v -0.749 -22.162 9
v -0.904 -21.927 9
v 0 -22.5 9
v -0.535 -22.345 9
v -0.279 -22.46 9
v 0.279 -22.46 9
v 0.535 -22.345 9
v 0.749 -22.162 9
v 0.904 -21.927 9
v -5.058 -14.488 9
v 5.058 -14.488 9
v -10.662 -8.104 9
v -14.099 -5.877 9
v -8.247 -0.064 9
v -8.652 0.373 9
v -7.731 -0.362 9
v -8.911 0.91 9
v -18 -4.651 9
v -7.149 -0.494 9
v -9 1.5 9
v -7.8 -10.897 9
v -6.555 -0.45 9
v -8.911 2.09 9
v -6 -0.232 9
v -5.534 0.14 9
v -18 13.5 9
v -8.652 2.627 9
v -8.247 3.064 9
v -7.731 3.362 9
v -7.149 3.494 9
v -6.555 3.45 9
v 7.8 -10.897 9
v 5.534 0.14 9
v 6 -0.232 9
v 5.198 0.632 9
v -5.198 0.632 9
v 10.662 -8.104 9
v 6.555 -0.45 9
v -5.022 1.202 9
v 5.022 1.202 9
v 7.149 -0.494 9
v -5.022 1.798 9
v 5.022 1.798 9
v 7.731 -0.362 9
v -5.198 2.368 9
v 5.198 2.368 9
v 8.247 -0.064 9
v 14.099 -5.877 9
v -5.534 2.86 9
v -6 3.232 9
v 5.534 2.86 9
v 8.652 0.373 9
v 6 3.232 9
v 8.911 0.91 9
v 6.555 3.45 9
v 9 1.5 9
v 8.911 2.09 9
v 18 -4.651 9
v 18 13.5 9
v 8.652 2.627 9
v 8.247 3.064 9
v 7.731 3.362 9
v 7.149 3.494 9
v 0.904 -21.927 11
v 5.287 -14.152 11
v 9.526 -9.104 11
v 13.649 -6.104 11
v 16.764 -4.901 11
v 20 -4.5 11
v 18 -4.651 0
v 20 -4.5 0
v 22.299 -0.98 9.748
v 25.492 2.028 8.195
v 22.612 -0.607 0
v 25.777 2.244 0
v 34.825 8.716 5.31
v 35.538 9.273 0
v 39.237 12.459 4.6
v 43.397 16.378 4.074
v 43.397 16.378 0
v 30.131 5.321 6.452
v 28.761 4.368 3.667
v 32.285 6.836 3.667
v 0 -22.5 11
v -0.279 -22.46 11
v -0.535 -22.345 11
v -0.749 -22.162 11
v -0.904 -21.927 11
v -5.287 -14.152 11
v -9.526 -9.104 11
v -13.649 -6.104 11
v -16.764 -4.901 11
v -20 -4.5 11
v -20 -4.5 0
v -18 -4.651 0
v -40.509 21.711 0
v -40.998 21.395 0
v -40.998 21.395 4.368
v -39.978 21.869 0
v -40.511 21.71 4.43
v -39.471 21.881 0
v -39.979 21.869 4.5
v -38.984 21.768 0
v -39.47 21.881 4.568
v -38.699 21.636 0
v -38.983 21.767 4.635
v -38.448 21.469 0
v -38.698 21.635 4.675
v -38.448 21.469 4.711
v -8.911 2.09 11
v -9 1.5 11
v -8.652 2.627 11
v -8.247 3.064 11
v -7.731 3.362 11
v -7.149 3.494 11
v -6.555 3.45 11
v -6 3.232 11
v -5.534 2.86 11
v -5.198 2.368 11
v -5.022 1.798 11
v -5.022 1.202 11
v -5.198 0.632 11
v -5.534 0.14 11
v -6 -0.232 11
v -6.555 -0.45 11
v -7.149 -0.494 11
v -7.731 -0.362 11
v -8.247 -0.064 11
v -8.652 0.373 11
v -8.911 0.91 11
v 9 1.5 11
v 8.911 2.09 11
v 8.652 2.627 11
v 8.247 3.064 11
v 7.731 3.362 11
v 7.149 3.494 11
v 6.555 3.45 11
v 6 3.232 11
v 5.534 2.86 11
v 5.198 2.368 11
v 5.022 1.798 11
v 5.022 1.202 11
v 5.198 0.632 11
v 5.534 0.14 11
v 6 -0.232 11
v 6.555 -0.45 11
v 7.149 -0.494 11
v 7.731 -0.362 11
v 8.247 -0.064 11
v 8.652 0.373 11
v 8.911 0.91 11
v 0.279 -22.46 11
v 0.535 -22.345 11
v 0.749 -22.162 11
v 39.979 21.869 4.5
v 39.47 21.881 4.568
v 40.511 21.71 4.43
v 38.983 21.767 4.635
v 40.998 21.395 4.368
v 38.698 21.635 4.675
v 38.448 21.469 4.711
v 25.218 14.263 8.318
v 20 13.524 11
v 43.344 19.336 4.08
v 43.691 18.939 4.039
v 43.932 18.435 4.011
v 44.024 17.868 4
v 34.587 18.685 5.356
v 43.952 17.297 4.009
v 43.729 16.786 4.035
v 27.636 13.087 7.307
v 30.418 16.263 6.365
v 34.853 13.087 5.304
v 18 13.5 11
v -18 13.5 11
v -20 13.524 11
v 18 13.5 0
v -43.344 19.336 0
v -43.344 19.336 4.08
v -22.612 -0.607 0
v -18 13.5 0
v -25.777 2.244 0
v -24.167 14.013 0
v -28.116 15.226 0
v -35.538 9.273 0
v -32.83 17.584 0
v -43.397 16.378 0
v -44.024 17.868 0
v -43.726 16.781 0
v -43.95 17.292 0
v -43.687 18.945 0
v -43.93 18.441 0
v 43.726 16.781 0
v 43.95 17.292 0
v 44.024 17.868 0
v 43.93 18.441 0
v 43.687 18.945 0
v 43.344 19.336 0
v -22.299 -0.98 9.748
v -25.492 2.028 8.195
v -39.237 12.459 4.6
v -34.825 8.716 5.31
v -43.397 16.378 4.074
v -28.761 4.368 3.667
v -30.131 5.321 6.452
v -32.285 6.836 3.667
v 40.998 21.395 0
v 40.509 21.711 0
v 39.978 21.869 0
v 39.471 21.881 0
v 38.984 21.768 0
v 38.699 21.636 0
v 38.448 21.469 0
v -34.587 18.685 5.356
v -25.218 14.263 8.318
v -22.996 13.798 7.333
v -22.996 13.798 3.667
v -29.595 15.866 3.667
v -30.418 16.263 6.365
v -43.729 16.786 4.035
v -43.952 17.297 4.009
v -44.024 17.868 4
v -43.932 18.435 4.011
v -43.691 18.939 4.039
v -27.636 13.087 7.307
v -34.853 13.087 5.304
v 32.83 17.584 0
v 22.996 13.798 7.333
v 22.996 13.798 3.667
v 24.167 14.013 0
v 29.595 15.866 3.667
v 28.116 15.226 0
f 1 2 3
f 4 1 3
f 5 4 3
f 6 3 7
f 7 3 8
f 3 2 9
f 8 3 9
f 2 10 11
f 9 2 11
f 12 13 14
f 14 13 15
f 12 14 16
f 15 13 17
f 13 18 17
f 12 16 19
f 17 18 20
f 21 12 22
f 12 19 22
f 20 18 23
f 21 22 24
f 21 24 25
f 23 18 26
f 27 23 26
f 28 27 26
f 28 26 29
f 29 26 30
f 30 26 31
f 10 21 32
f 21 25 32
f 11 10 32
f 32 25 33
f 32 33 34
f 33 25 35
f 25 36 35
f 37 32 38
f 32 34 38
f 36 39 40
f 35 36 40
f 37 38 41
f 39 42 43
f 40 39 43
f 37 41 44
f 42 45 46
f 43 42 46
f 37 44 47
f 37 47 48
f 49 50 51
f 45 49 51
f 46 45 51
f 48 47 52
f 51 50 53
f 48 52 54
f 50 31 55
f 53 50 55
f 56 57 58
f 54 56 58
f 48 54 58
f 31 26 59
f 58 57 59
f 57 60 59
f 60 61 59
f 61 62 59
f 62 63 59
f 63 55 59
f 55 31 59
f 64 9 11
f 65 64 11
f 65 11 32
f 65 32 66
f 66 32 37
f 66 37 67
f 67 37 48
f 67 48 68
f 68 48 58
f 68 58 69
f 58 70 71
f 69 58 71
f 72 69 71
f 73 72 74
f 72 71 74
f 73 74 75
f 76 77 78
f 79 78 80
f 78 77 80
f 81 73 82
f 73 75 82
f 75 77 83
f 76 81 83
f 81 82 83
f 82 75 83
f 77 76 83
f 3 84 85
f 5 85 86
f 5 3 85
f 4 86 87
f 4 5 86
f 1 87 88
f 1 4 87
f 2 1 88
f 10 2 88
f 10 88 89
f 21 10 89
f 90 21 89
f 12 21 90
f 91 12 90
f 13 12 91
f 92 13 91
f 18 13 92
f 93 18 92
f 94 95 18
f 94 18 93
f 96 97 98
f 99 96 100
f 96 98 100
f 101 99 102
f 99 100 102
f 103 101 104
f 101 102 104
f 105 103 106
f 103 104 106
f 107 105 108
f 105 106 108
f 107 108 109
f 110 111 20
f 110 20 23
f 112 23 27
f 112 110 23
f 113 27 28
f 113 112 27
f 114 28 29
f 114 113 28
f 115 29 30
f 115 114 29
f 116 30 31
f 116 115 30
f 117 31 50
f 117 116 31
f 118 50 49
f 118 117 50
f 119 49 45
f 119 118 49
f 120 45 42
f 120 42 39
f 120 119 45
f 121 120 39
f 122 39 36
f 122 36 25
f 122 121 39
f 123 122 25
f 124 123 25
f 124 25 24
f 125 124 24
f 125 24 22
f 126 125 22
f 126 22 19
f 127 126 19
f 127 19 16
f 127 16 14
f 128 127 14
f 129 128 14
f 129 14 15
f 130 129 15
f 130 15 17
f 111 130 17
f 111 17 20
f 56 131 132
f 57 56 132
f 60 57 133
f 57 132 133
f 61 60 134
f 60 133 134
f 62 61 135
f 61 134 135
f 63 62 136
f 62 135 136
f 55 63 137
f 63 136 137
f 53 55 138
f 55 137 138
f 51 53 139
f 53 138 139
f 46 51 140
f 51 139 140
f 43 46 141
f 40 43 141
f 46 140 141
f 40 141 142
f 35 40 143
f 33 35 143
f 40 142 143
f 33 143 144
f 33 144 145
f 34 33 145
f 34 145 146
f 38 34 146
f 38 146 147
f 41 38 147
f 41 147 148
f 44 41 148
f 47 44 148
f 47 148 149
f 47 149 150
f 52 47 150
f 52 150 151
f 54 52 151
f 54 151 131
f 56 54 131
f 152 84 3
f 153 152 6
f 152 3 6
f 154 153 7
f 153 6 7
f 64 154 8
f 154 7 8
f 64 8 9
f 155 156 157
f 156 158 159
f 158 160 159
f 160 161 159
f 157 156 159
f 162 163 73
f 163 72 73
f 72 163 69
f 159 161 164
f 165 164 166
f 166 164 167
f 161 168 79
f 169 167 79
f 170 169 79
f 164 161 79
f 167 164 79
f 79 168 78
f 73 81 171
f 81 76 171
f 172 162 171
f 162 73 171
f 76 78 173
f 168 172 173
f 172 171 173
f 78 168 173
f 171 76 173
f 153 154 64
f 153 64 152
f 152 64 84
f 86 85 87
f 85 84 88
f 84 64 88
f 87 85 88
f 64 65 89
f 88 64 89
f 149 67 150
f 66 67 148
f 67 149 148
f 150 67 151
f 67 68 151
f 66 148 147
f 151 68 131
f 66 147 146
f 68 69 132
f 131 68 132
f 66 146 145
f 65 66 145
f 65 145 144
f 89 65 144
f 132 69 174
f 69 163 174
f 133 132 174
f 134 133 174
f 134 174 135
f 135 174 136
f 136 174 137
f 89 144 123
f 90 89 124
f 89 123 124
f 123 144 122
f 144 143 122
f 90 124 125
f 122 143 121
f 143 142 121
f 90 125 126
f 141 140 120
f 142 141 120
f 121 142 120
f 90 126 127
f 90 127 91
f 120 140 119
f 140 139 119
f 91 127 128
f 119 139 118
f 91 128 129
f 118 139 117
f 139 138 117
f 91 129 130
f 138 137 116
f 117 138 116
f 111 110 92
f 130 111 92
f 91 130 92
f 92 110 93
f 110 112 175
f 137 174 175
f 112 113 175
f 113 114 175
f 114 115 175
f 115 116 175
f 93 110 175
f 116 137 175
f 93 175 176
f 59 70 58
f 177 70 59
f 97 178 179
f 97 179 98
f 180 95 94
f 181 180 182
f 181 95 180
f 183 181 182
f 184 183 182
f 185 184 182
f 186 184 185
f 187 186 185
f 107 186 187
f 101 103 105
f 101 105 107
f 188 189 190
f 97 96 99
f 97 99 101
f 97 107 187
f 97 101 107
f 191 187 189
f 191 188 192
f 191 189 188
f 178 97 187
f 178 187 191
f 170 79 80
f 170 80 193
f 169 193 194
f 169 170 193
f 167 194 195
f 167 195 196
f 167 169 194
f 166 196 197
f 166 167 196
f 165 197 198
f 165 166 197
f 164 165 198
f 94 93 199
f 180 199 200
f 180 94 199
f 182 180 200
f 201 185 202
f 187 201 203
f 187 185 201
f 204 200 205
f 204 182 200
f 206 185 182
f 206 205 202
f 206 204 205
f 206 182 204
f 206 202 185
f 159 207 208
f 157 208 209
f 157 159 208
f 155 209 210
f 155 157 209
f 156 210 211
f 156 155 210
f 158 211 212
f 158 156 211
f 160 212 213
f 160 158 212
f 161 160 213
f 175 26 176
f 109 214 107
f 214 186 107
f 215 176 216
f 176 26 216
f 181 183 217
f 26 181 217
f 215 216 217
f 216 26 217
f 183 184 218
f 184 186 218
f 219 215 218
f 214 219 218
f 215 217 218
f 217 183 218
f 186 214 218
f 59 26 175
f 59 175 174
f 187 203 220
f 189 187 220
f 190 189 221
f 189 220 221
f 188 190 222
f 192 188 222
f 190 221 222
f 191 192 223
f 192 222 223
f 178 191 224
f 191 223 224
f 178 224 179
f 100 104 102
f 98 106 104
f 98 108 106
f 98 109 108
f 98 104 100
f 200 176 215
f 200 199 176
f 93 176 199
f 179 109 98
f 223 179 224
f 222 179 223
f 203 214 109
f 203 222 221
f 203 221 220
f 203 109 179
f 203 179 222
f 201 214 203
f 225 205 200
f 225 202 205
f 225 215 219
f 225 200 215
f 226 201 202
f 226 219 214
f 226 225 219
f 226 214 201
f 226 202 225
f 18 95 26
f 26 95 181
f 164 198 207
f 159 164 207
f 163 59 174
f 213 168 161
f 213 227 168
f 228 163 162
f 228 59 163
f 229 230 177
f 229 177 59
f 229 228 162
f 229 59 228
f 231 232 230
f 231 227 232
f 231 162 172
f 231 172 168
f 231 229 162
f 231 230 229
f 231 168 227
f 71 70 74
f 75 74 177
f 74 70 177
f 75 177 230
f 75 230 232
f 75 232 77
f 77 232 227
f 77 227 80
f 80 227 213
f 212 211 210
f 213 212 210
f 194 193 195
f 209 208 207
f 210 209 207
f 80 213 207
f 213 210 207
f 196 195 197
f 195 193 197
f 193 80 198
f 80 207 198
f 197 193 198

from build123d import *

# Parameters (mm, degrees)
MAIN_DEPTH         = 11
FILLET1_R          = 2
SKETCH2_W          = 18
SKETCH2_H          = 36
CUT_EXTRUDE1_DEPTH = 9
CUT_EXTRUDE3_DEPTH = 64.480897399
SKETCH5_R          = 2
CUT_EXTRUDE4_DEPTH = 51.650082667


with BuildPart() as part:
    # Sketch1 → Main (new body)
    with BuildSketch(Plane.XY):
        with BuildLine():
            Line((0, 13.5), (0, -22.5))
            ThreePointArc((0, -22.5), (0.535266132, -22.344683472), (0.904260909, -21.926980336))
            add(Edge.make_bspline(
                [(0.904260909, -21.926980336), (9.133056217, -4.5), (20, -4.5)],
                knots=[0, 0, 0, 1, 1, 1], degree=2))
            add(Edge.make_bspline(
                [(20, -4.5), (22.442131921, -0.087784975), (24.417478165, 1.364672535), (37.311838004, 10.291321925), (39.092642364, 12.366823321), (45, 17.882159487)],
                knots=[0, 0, 0, 0, 0.423319092, 0.523319092, 1, 1, 1, 1], degree=3))
            Line((45, 17.882159487), (39.739244446, 22.5))
            add(Edge.make_bspline(
                [(18, 13.5), (22.59390453, 13.5), (28.738216645, 13.511797359), (39.739244446, 22.5)],
                knots=[0, 0, 0, 0, 1, 1, 1, 1], degree=3))
            Line((18, 13.5), (0, 13.5))
        make_face()
    extrude(amount=MAIN_DEPTH)

    # Fillet1
    fillet1_edges = [part.edges().sort_by_distance(p)[0] for p in [
        (45, 17.882159487, 5.5),
        (39.739244446, 22.5, 5.5),
    ]]
    fillet(fillet1_edges, radius=FILLET1_R)

    # Sketch2 → Cut-Extrude1 (cut)
    with BuildSketch(Plane(origin=(0, 0, 0), x_dir=(-1, 0, 0), z_dir=(0, 0, -1))):
        with Locations((-9, -4.5)):
            Rectangle(SKETCH2_W, SKETCH2_H)
    extrude(amount=-CUT_EXTRUDE1_DEPTH, mode=Mode.SUBTRACT)

    # Sketch4 → Cut-Extrude3 (cut, through all)
    with BuildSketch(Plane(origin=(0, -22.5, 0), x_dir=(1, 0, 0), z_dir=(0, 1, 0))):
        with BuildLine():
            Line((20, -11), (44.024775506, -11))
            Line((44.024775506, -11), (44.024775506, -4))
            add(Edge.make_bspline(
                [(20, -11), (28.635170746, -6.13298307), (33.086101869, -5.284313506), (44.024775506, -4)],
                knots=[0, 0, 0, 0, 1, 1, 1, 1], degree=3))
        make_face()
    extrude(amount=CUT_EXTRUDE3_DEPTH, mode=Mode.SUBTRACT)

    # Sketch5 → Cut-Extrude4 (cut, through all)
    with BuildSketch(Plane.XY.offset(11)):
        with Locations((7, 1.5)):
            Circle(SKETCH5_R)
    extrude(amount=-CUT_EXTRUDE4_DEPTH, mode=Mode.SUBTRACT)

    # Mirror1: part across plane


with BuildPart() as part_1:
    add(part.part)
    add(part.part.mirror(Plane(origin=(0, 13.5, 11), x_dir=(0, 0, 1), z_dir=(1, 0, 0))))


solid = part_1.part
